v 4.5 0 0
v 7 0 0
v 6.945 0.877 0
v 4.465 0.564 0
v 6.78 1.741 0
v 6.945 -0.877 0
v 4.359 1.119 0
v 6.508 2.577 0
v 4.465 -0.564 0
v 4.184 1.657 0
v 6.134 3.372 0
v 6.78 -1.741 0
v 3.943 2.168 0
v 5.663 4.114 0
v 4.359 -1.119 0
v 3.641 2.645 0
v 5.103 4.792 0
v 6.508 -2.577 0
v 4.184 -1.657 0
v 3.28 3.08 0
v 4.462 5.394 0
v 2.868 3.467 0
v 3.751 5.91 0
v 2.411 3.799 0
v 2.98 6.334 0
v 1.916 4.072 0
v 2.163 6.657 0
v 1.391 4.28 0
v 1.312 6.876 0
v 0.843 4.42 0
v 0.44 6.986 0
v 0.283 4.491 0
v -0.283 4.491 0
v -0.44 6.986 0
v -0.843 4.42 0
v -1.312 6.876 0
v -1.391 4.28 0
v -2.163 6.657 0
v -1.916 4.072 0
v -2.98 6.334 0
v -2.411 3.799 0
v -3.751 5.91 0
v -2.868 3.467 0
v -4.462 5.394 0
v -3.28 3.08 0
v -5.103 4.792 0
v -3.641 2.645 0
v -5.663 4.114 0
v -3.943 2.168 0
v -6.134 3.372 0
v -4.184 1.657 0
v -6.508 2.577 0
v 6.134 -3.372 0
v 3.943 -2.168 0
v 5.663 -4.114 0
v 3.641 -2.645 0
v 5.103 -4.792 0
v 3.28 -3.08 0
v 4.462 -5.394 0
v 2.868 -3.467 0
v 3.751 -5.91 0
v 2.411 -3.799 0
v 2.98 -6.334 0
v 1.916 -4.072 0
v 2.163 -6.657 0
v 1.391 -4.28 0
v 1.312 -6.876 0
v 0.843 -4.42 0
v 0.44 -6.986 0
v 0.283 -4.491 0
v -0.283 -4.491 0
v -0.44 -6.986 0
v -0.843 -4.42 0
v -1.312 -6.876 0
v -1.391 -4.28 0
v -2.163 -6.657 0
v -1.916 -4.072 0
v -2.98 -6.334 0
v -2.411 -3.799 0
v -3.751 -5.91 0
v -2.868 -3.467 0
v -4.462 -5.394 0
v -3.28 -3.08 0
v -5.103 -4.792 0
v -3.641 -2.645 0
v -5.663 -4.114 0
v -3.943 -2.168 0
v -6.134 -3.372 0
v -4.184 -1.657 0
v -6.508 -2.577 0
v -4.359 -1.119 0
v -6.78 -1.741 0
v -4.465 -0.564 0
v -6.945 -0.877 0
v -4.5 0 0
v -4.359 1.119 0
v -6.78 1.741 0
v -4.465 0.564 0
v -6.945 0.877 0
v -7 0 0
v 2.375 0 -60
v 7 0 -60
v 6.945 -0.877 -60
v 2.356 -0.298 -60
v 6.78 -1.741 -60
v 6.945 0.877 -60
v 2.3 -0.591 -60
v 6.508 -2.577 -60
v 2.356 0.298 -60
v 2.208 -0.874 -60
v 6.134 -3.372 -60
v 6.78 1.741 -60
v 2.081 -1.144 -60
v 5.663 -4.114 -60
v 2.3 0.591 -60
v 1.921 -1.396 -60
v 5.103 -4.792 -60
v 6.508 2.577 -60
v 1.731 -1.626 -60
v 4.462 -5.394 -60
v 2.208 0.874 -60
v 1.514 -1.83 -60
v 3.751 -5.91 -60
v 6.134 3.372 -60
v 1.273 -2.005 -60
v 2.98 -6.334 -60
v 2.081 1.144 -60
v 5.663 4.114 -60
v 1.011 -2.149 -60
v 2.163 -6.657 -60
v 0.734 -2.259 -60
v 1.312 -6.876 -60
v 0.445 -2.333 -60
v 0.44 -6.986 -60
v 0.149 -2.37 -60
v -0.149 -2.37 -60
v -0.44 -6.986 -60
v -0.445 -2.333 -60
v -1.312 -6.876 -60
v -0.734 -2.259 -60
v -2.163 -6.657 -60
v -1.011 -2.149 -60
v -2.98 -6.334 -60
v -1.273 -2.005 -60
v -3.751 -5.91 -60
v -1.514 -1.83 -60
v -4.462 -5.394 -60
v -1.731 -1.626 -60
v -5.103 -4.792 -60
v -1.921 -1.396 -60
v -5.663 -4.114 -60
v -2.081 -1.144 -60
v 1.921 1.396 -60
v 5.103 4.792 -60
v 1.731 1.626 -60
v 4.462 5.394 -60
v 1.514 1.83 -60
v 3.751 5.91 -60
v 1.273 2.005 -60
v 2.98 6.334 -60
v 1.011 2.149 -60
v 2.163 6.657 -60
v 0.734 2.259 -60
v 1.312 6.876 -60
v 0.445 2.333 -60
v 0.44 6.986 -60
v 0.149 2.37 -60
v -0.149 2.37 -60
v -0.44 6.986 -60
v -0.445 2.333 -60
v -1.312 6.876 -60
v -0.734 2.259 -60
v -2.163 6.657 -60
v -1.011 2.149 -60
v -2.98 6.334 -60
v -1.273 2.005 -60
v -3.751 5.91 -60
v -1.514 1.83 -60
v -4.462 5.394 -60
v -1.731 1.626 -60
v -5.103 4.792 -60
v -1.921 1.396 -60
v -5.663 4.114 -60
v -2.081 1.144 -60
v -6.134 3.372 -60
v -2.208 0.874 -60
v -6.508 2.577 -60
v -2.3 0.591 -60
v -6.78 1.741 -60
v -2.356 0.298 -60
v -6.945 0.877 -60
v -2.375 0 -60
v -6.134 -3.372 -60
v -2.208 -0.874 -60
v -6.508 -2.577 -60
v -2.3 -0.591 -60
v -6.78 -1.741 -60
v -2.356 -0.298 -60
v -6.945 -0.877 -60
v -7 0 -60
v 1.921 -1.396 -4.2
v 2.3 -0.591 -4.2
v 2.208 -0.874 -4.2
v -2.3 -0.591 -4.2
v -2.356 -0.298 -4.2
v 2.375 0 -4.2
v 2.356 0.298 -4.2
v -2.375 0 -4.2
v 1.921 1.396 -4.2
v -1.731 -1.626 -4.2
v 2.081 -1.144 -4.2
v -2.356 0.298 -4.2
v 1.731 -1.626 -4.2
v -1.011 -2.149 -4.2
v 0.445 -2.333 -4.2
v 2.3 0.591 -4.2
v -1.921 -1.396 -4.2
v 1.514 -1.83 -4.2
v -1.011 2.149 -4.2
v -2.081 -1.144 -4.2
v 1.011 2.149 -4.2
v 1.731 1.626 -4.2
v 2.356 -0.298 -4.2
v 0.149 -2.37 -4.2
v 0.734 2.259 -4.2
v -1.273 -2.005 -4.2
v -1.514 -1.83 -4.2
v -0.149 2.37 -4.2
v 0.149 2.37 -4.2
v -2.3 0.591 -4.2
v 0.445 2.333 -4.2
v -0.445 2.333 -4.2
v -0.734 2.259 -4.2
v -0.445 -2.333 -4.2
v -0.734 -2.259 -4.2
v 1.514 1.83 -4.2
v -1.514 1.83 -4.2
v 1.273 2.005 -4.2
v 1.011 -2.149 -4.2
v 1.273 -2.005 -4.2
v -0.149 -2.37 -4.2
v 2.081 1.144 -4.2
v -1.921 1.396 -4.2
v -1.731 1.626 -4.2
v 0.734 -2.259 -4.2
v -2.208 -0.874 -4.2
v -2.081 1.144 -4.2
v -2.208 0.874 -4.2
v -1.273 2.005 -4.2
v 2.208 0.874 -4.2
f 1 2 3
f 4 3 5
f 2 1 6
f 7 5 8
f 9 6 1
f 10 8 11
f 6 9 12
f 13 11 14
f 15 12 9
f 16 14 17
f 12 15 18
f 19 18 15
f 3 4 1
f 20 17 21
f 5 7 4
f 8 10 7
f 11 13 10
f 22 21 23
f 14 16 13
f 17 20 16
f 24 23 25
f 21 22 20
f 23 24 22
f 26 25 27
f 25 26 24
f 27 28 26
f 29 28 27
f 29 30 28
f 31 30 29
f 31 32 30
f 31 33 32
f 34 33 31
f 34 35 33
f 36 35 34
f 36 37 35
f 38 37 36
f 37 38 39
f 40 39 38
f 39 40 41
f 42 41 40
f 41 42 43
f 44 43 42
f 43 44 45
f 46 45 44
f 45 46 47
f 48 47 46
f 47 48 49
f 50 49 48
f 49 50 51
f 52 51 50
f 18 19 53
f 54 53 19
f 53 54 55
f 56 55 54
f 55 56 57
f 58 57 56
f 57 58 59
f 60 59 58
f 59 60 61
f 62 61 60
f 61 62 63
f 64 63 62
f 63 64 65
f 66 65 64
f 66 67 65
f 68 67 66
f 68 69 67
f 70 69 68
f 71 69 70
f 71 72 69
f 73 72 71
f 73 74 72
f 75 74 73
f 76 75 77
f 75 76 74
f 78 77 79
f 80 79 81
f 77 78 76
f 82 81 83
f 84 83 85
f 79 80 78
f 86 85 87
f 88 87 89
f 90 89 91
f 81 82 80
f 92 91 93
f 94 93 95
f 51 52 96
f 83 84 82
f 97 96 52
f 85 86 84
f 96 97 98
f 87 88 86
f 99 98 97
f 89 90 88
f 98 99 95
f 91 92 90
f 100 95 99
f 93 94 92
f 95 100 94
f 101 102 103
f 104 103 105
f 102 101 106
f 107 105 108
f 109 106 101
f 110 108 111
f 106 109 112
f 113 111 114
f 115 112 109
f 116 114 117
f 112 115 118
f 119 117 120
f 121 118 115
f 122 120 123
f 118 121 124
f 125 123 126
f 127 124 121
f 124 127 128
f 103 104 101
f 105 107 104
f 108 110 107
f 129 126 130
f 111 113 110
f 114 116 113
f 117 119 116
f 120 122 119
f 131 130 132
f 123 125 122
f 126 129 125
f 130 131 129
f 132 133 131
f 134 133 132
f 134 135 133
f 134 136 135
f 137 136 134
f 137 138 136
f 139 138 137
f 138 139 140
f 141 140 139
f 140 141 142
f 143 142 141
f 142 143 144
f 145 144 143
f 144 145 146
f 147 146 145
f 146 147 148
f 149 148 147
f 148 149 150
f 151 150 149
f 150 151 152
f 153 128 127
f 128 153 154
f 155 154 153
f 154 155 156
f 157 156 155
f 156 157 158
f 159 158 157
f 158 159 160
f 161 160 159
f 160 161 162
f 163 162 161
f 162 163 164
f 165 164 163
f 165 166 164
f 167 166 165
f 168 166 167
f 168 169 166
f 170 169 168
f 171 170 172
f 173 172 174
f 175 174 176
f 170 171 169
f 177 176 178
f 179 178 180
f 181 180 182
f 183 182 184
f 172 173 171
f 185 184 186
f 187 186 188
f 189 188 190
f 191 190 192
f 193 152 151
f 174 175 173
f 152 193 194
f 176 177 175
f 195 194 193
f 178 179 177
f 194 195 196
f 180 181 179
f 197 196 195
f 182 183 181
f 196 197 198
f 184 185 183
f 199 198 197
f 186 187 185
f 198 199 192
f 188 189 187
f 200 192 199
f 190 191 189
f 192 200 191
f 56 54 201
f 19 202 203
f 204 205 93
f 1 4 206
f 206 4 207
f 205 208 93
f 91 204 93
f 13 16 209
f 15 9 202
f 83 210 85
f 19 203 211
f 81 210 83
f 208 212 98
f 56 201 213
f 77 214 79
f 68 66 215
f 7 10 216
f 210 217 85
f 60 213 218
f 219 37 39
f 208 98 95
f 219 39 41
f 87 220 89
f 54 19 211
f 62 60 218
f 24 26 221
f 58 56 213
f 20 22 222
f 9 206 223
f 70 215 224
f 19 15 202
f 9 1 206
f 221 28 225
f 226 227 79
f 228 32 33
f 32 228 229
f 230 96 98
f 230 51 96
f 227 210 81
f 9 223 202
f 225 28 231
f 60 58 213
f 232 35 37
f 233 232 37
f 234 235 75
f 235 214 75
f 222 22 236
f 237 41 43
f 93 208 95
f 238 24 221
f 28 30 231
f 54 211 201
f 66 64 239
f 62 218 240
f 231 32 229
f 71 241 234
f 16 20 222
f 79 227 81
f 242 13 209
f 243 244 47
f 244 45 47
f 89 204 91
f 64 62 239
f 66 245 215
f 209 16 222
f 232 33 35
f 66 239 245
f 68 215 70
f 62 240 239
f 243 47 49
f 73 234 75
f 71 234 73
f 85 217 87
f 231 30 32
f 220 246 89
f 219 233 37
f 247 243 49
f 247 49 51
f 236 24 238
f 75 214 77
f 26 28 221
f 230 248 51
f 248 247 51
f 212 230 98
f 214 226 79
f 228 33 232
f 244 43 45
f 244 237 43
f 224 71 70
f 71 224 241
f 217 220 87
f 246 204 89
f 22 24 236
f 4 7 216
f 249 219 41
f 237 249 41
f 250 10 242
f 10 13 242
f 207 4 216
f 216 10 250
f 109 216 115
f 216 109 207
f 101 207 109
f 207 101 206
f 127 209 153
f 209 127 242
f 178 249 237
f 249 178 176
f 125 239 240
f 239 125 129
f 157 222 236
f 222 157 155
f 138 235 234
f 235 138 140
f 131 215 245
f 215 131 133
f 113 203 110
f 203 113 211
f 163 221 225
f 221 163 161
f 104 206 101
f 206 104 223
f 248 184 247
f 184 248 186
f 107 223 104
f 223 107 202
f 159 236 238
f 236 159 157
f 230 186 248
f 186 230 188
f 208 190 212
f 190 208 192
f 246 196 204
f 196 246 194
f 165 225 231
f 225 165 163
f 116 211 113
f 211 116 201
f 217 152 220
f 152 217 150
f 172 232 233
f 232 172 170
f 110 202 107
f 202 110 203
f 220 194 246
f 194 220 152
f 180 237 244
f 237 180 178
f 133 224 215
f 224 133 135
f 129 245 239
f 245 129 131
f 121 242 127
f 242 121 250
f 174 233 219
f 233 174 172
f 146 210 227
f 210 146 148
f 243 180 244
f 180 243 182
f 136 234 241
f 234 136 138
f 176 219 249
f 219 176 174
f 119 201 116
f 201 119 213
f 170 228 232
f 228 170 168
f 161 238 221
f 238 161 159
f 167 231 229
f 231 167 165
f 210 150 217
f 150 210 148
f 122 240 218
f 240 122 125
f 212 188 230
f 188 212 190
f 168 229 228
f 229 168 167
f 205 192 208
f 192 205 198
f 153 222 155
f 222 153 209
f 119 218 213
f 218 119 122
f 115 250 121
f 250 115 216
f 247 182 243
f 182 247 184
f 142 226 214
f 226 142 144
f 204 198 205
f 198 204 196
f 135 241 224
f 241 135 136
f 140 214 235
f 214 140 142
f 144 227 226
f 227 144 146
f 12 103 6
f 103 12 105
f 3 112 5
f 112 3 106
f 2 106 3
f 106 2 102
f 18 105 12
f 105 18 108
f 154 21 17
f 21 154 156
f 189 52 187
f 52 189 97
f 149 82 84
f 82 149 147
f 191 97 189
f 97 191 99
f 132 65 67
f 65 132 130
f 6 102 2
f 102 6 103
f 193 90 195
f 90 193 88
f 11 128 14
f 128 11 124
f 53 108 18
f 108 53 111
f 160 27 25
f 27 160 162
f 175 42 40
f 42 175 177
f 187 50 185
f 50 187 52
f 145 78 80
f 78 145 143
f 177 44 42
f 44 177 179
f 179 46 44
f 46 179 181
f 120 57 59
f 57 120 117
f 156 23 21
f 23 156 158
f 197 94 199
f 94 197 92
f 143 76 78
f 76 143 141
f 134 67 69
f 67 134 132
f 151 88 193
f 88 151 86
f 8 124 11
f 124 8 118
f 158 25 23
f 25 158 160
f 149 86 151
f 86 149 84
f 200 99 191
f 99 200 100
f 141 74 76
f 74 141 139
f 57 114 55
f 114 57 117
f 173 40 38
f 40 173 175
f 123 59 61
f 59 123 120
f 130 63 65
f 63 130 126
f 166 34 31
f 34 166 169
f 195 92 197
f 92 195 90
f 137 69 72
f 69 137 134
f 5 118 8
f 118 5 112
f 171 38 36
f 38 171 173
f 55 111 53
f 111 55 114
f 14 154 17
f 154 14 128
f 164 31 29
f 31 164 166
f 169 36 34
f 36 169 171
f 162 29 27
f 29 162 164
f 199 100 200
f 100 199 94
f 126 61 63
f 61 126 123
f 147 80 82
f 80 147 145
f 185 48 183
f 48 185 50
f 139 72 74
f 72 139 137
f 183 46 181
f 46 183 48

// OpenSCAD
$fn = 50;


difference() {
	union() {
		translate(v = [0, 0, -60.0000000000]) {
			cylinder(h = 60, r = 7.0000000000);
		}
		cylinder(h = 0, r = 17.0000000000);
	}
	union() {
		translate(v = [0, 0, 0]) {
			rotate(a = [0, 0, 0]) {
				difference() {
					union() {
						#translate(v = [0, 0, -60.0000000000]) {
							cylinder(h = 60, r = 2.2500000000);
						}
						#translate(v = [0, 0, -4.2000000000]) {
							cylinder(h = 4.2000000000, r = 7.0000000000, r1 = 2.3750000000, r2 = 4.5000000000);
						}
						#translate(v = [0, 0, -60.0000000000]) {
							cylinder(h = 60, r = 2.3750000000);
						}
						#translate(v = [0, 0, -60.0000000000]) {
							cylinder(h = 60, r = 2.2500000000);
						}
					}
					union();
				}
			}
		}
	}
}
